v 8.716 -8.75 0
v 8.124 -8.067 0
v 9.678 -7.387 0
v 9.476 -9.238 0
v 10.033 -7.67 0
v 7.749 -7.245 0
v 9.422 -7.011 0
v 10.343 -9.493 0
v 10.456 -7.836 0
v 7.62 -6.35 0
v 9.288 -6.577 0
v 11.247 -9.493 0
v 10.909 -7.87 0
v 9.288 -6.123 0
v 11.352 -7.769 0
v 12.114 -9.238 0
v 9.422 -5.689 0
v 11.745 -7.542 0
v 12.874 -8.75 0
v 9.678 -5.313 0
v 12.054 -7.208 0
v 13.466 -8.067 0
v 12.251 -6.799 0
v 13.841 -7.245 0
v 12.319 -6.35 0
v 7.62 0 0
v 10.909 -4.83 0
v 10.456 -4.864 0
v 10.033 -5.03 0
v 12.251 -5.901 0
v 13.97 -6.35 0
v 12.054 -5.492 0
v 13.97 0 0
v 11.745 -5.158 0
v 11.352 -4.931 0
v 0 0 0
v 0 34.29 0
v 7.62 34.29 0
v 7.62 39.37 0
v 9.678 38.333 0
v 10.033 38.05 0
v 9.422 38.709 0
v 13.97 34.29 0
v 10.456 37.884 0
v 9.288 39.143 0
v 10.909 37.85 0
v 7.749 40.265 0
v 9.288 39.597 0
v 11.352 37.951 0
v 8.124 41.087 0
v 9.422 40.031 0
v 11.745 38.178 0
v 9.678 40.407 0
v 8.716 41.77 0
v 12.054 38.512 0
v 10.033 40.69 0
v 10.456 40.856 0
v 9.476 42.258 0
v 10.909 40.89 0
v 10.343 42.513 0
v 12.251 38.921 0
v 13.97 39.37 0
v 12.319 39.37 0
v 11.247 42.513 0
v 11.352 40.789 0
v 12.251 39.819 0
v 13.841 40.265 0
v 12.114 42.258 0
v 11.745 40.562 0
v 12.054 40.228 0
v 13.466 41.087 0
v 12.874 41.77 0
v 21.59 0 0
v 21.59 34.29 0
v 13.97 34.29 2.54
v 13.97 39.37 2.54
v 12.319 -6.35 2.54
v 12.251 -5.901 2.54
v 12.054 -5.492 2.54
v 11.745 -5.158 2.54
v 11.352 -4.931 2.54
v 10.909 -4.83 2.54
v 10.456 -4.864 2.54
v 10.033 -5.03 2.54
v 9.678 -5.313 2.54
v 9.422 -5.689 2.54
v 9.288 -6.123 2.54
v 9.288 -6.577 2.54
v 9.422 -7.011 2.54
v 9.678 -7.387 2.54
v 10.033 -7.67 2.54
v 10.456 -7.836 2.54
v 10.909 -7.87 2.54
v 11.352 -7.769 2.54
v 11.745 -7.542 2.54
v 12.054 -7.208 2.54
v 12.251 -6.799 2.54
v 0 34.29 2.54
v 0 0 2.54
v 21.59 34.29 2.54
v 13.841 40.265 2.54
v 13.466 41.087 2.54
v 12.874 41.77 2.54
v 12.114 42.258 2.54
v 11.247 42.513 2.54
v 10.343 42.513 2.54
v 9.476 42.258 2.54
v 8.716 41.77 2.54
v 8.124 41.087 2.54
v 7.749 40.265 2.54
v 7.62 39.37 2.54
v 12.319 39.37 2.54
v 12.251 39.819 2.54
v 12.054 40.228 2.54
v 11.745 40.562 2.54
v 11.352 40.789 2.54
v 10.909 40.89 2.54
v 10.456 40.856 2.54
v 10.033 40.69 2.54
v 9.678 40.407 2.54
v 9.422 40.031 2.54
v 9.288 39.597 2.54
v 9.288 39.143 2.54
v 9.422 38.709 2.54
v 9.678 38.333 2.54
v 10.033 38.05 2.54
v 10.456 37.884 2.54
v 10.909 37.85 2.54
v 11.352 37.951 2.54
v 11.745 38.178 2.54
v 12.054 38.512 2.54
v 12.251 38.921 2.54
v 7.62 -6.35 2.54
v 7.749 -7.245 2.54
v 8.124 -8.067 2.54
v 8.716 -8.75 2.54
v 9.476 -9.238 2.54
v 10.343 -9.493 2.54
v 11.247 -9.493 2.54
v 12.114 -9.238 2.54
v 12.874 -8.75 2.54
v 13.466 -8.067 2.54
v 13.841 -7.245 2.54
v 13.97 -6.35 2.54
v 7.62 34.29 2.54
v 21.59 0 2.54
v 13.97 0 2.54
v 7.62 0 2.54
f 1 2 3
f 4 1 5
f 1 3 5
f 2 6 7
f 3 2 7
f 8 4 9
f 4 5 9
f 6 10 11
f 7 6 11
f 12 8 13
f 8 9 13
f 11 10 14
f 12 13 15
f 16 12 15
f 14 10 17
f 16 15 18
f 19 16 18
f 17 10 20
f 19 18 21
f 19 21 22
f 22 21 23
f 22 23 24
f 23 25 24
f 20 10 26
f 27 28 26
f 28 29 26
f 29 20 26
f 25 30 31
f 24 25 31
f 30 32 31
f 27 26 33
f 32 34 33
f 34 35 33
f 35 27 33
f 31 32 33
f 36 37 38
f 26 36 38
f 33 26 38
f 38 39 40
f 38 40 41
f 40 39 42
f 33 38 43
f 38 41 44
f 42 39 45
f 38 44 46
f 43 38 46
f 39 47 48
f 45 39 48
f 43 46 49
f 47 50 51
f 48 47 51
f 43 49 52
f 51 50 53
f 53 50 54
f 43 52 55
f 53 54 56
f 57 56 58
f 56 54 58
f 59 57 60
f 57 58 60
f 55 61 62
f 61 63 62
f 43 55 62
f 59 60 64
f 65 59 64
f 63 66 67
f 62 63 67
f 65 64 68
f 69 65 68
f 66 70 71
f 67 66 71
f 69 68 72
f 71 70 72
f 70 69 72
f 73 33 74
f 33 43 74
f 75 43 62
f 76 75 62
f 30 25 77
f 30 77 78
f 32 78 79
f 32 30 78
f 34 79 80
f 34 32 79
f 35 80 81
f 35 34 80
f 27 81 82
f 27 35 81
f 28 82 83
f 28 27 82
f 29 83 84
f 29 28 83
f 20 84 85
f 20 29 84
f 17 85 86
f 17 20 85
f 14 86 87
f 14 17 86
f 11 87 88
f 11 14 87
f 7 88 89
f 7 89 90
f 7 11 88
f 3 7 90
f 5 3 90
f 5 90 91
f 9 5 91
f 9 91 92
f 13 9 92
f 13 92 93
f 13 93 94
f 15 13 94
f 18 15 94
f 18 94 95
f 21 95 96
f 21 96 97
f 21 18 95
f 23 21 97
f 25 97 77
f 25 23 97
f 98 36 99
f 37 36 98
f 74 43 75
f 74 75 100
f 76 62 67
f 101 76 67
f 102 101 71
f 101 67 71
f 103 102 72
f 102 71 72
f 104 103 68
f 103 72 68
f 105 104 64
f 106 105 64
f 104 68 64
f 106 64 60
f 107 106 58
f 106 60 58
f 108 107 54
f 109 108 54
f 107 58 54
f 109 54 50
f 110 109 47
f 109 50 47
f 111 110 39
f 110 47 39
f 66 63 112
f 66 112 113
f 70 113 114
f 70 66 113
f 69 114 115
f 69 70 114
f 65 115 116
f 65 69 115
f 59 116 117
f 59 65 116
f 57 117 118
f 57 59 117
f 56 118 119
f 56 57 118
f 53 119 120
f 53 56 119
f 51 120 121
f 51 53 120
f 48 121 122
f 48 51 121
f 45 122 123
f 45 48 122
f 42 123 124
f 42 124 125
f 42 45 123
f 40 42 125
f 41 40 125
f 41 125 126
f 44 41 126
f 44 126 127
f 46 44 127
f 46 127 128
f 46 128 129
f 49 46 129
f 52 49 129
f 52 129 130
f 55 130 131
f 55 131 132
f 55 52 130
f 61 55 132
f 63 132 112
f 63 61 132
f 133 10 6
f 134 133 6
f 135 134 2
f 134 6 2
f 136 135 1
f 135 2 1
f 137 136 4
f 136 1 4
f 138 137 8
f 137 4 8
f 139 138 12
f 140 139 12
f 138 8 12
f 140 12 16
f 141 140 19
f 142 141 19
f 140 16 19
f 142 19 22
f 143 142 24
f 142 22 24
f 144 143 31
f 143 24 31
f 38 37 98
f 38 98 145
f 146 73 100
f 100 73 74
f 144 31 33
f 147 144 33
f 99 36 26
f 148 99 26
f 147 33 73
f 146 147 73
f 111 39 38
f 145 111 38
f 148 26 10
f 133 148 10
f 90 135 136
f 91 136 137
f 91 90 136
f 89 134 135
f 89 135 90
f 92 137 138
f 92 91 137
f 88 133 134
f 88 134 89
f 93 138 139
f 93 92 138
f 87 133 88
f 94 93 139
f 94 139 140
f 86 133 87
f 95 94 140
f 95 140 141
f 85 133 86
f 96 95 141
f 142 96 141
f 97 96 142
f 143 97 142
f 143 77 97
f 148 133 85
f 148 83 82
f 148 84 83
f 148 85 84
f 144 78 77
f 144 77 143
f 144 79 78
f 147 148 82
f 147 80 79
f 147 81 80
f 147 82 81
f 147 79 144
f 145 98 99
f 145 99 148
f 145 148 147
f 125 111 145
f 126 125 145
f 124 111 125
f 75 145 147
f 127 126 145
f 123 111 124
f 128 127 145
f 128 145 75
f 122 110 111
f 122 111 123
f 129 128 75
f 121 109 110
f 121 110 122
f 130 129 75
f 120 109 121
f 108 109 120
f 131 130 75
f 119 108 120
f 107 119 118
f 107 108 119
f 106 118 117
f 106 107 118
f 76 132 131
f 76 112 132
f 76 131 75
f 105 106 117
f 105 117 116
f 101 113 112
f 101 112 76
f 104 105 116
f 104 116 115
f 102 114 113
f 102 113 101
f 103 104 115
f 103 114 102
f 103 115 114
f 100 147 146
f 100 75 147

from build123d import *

# Parameters (mm, degrees)
SKETCH1_R           = 3.175
SKETCH1_R_2         = 1.524
SKETCH1_W           = 21.59
SKETCH1_H           = 34.29
BOSS_EXTRUDE1_DEPTH = 2.54


with BuildPart() as part:
    # Sketch1 → Boss-Extrude1 (new body)
    # profile 1 of 5: a face of its own
    with BuildSketch(Plane.XY):
        with Locations((10.795, 39.37)):
            Circle(SKETCH1_R)
        with Locations((10.795, 39.37)):
            Circle(SKETCH1_R_2, mode=Mode.SUBTRACT)
    # profile 2 of 5: a face of its own
    with BuildSketch(Plane.XY):
        with BuildLine():
            ThreePointArc((13.97, 39.37), (10.795, 36.195), (7.62, 39.37))
            Line((7.62, 39.37), (7.62, 34.29))
            Line((7.62, 34.29), (13.97, 34.29))
            Line((13.97, 34.29), (13.97, 39.37))
        make_face()
    # profile 3 of 5: a face of its own
    with BuildSketch(Plane.XY):
        with Locations((10.795, 17.145)):
            Rectangle(SKETCH1_W, SKETCH1_H)
    # profile 4 of 5: a face of its own
    with BuildSketch(Plane.XY):
        with BuildLine():
            Line((13.97, 0), (7.62, 0))
            Line((7.62, 0), (7.62, -6.35))
            ThreePointArc((7.62, -6.35), (10.795, -3.175), (13.97, -6.35))
            Line((13.97, -6.35), (13.97, 0))
        make_face()
    # profile 5 of 5: a face of its own
    with BuildSketch(Plane.XY):
        with Locations((10.795, -6.35)):
            Circle(SKETCH1_R)
        with Locations((10.795, -6.35)):
            Circle(SKETCH1_R_2, mode=Mode.SUBTRACT)
    extrude(amount=BOSS_EXTRUDE1_DEPTH)


solid = part.part
